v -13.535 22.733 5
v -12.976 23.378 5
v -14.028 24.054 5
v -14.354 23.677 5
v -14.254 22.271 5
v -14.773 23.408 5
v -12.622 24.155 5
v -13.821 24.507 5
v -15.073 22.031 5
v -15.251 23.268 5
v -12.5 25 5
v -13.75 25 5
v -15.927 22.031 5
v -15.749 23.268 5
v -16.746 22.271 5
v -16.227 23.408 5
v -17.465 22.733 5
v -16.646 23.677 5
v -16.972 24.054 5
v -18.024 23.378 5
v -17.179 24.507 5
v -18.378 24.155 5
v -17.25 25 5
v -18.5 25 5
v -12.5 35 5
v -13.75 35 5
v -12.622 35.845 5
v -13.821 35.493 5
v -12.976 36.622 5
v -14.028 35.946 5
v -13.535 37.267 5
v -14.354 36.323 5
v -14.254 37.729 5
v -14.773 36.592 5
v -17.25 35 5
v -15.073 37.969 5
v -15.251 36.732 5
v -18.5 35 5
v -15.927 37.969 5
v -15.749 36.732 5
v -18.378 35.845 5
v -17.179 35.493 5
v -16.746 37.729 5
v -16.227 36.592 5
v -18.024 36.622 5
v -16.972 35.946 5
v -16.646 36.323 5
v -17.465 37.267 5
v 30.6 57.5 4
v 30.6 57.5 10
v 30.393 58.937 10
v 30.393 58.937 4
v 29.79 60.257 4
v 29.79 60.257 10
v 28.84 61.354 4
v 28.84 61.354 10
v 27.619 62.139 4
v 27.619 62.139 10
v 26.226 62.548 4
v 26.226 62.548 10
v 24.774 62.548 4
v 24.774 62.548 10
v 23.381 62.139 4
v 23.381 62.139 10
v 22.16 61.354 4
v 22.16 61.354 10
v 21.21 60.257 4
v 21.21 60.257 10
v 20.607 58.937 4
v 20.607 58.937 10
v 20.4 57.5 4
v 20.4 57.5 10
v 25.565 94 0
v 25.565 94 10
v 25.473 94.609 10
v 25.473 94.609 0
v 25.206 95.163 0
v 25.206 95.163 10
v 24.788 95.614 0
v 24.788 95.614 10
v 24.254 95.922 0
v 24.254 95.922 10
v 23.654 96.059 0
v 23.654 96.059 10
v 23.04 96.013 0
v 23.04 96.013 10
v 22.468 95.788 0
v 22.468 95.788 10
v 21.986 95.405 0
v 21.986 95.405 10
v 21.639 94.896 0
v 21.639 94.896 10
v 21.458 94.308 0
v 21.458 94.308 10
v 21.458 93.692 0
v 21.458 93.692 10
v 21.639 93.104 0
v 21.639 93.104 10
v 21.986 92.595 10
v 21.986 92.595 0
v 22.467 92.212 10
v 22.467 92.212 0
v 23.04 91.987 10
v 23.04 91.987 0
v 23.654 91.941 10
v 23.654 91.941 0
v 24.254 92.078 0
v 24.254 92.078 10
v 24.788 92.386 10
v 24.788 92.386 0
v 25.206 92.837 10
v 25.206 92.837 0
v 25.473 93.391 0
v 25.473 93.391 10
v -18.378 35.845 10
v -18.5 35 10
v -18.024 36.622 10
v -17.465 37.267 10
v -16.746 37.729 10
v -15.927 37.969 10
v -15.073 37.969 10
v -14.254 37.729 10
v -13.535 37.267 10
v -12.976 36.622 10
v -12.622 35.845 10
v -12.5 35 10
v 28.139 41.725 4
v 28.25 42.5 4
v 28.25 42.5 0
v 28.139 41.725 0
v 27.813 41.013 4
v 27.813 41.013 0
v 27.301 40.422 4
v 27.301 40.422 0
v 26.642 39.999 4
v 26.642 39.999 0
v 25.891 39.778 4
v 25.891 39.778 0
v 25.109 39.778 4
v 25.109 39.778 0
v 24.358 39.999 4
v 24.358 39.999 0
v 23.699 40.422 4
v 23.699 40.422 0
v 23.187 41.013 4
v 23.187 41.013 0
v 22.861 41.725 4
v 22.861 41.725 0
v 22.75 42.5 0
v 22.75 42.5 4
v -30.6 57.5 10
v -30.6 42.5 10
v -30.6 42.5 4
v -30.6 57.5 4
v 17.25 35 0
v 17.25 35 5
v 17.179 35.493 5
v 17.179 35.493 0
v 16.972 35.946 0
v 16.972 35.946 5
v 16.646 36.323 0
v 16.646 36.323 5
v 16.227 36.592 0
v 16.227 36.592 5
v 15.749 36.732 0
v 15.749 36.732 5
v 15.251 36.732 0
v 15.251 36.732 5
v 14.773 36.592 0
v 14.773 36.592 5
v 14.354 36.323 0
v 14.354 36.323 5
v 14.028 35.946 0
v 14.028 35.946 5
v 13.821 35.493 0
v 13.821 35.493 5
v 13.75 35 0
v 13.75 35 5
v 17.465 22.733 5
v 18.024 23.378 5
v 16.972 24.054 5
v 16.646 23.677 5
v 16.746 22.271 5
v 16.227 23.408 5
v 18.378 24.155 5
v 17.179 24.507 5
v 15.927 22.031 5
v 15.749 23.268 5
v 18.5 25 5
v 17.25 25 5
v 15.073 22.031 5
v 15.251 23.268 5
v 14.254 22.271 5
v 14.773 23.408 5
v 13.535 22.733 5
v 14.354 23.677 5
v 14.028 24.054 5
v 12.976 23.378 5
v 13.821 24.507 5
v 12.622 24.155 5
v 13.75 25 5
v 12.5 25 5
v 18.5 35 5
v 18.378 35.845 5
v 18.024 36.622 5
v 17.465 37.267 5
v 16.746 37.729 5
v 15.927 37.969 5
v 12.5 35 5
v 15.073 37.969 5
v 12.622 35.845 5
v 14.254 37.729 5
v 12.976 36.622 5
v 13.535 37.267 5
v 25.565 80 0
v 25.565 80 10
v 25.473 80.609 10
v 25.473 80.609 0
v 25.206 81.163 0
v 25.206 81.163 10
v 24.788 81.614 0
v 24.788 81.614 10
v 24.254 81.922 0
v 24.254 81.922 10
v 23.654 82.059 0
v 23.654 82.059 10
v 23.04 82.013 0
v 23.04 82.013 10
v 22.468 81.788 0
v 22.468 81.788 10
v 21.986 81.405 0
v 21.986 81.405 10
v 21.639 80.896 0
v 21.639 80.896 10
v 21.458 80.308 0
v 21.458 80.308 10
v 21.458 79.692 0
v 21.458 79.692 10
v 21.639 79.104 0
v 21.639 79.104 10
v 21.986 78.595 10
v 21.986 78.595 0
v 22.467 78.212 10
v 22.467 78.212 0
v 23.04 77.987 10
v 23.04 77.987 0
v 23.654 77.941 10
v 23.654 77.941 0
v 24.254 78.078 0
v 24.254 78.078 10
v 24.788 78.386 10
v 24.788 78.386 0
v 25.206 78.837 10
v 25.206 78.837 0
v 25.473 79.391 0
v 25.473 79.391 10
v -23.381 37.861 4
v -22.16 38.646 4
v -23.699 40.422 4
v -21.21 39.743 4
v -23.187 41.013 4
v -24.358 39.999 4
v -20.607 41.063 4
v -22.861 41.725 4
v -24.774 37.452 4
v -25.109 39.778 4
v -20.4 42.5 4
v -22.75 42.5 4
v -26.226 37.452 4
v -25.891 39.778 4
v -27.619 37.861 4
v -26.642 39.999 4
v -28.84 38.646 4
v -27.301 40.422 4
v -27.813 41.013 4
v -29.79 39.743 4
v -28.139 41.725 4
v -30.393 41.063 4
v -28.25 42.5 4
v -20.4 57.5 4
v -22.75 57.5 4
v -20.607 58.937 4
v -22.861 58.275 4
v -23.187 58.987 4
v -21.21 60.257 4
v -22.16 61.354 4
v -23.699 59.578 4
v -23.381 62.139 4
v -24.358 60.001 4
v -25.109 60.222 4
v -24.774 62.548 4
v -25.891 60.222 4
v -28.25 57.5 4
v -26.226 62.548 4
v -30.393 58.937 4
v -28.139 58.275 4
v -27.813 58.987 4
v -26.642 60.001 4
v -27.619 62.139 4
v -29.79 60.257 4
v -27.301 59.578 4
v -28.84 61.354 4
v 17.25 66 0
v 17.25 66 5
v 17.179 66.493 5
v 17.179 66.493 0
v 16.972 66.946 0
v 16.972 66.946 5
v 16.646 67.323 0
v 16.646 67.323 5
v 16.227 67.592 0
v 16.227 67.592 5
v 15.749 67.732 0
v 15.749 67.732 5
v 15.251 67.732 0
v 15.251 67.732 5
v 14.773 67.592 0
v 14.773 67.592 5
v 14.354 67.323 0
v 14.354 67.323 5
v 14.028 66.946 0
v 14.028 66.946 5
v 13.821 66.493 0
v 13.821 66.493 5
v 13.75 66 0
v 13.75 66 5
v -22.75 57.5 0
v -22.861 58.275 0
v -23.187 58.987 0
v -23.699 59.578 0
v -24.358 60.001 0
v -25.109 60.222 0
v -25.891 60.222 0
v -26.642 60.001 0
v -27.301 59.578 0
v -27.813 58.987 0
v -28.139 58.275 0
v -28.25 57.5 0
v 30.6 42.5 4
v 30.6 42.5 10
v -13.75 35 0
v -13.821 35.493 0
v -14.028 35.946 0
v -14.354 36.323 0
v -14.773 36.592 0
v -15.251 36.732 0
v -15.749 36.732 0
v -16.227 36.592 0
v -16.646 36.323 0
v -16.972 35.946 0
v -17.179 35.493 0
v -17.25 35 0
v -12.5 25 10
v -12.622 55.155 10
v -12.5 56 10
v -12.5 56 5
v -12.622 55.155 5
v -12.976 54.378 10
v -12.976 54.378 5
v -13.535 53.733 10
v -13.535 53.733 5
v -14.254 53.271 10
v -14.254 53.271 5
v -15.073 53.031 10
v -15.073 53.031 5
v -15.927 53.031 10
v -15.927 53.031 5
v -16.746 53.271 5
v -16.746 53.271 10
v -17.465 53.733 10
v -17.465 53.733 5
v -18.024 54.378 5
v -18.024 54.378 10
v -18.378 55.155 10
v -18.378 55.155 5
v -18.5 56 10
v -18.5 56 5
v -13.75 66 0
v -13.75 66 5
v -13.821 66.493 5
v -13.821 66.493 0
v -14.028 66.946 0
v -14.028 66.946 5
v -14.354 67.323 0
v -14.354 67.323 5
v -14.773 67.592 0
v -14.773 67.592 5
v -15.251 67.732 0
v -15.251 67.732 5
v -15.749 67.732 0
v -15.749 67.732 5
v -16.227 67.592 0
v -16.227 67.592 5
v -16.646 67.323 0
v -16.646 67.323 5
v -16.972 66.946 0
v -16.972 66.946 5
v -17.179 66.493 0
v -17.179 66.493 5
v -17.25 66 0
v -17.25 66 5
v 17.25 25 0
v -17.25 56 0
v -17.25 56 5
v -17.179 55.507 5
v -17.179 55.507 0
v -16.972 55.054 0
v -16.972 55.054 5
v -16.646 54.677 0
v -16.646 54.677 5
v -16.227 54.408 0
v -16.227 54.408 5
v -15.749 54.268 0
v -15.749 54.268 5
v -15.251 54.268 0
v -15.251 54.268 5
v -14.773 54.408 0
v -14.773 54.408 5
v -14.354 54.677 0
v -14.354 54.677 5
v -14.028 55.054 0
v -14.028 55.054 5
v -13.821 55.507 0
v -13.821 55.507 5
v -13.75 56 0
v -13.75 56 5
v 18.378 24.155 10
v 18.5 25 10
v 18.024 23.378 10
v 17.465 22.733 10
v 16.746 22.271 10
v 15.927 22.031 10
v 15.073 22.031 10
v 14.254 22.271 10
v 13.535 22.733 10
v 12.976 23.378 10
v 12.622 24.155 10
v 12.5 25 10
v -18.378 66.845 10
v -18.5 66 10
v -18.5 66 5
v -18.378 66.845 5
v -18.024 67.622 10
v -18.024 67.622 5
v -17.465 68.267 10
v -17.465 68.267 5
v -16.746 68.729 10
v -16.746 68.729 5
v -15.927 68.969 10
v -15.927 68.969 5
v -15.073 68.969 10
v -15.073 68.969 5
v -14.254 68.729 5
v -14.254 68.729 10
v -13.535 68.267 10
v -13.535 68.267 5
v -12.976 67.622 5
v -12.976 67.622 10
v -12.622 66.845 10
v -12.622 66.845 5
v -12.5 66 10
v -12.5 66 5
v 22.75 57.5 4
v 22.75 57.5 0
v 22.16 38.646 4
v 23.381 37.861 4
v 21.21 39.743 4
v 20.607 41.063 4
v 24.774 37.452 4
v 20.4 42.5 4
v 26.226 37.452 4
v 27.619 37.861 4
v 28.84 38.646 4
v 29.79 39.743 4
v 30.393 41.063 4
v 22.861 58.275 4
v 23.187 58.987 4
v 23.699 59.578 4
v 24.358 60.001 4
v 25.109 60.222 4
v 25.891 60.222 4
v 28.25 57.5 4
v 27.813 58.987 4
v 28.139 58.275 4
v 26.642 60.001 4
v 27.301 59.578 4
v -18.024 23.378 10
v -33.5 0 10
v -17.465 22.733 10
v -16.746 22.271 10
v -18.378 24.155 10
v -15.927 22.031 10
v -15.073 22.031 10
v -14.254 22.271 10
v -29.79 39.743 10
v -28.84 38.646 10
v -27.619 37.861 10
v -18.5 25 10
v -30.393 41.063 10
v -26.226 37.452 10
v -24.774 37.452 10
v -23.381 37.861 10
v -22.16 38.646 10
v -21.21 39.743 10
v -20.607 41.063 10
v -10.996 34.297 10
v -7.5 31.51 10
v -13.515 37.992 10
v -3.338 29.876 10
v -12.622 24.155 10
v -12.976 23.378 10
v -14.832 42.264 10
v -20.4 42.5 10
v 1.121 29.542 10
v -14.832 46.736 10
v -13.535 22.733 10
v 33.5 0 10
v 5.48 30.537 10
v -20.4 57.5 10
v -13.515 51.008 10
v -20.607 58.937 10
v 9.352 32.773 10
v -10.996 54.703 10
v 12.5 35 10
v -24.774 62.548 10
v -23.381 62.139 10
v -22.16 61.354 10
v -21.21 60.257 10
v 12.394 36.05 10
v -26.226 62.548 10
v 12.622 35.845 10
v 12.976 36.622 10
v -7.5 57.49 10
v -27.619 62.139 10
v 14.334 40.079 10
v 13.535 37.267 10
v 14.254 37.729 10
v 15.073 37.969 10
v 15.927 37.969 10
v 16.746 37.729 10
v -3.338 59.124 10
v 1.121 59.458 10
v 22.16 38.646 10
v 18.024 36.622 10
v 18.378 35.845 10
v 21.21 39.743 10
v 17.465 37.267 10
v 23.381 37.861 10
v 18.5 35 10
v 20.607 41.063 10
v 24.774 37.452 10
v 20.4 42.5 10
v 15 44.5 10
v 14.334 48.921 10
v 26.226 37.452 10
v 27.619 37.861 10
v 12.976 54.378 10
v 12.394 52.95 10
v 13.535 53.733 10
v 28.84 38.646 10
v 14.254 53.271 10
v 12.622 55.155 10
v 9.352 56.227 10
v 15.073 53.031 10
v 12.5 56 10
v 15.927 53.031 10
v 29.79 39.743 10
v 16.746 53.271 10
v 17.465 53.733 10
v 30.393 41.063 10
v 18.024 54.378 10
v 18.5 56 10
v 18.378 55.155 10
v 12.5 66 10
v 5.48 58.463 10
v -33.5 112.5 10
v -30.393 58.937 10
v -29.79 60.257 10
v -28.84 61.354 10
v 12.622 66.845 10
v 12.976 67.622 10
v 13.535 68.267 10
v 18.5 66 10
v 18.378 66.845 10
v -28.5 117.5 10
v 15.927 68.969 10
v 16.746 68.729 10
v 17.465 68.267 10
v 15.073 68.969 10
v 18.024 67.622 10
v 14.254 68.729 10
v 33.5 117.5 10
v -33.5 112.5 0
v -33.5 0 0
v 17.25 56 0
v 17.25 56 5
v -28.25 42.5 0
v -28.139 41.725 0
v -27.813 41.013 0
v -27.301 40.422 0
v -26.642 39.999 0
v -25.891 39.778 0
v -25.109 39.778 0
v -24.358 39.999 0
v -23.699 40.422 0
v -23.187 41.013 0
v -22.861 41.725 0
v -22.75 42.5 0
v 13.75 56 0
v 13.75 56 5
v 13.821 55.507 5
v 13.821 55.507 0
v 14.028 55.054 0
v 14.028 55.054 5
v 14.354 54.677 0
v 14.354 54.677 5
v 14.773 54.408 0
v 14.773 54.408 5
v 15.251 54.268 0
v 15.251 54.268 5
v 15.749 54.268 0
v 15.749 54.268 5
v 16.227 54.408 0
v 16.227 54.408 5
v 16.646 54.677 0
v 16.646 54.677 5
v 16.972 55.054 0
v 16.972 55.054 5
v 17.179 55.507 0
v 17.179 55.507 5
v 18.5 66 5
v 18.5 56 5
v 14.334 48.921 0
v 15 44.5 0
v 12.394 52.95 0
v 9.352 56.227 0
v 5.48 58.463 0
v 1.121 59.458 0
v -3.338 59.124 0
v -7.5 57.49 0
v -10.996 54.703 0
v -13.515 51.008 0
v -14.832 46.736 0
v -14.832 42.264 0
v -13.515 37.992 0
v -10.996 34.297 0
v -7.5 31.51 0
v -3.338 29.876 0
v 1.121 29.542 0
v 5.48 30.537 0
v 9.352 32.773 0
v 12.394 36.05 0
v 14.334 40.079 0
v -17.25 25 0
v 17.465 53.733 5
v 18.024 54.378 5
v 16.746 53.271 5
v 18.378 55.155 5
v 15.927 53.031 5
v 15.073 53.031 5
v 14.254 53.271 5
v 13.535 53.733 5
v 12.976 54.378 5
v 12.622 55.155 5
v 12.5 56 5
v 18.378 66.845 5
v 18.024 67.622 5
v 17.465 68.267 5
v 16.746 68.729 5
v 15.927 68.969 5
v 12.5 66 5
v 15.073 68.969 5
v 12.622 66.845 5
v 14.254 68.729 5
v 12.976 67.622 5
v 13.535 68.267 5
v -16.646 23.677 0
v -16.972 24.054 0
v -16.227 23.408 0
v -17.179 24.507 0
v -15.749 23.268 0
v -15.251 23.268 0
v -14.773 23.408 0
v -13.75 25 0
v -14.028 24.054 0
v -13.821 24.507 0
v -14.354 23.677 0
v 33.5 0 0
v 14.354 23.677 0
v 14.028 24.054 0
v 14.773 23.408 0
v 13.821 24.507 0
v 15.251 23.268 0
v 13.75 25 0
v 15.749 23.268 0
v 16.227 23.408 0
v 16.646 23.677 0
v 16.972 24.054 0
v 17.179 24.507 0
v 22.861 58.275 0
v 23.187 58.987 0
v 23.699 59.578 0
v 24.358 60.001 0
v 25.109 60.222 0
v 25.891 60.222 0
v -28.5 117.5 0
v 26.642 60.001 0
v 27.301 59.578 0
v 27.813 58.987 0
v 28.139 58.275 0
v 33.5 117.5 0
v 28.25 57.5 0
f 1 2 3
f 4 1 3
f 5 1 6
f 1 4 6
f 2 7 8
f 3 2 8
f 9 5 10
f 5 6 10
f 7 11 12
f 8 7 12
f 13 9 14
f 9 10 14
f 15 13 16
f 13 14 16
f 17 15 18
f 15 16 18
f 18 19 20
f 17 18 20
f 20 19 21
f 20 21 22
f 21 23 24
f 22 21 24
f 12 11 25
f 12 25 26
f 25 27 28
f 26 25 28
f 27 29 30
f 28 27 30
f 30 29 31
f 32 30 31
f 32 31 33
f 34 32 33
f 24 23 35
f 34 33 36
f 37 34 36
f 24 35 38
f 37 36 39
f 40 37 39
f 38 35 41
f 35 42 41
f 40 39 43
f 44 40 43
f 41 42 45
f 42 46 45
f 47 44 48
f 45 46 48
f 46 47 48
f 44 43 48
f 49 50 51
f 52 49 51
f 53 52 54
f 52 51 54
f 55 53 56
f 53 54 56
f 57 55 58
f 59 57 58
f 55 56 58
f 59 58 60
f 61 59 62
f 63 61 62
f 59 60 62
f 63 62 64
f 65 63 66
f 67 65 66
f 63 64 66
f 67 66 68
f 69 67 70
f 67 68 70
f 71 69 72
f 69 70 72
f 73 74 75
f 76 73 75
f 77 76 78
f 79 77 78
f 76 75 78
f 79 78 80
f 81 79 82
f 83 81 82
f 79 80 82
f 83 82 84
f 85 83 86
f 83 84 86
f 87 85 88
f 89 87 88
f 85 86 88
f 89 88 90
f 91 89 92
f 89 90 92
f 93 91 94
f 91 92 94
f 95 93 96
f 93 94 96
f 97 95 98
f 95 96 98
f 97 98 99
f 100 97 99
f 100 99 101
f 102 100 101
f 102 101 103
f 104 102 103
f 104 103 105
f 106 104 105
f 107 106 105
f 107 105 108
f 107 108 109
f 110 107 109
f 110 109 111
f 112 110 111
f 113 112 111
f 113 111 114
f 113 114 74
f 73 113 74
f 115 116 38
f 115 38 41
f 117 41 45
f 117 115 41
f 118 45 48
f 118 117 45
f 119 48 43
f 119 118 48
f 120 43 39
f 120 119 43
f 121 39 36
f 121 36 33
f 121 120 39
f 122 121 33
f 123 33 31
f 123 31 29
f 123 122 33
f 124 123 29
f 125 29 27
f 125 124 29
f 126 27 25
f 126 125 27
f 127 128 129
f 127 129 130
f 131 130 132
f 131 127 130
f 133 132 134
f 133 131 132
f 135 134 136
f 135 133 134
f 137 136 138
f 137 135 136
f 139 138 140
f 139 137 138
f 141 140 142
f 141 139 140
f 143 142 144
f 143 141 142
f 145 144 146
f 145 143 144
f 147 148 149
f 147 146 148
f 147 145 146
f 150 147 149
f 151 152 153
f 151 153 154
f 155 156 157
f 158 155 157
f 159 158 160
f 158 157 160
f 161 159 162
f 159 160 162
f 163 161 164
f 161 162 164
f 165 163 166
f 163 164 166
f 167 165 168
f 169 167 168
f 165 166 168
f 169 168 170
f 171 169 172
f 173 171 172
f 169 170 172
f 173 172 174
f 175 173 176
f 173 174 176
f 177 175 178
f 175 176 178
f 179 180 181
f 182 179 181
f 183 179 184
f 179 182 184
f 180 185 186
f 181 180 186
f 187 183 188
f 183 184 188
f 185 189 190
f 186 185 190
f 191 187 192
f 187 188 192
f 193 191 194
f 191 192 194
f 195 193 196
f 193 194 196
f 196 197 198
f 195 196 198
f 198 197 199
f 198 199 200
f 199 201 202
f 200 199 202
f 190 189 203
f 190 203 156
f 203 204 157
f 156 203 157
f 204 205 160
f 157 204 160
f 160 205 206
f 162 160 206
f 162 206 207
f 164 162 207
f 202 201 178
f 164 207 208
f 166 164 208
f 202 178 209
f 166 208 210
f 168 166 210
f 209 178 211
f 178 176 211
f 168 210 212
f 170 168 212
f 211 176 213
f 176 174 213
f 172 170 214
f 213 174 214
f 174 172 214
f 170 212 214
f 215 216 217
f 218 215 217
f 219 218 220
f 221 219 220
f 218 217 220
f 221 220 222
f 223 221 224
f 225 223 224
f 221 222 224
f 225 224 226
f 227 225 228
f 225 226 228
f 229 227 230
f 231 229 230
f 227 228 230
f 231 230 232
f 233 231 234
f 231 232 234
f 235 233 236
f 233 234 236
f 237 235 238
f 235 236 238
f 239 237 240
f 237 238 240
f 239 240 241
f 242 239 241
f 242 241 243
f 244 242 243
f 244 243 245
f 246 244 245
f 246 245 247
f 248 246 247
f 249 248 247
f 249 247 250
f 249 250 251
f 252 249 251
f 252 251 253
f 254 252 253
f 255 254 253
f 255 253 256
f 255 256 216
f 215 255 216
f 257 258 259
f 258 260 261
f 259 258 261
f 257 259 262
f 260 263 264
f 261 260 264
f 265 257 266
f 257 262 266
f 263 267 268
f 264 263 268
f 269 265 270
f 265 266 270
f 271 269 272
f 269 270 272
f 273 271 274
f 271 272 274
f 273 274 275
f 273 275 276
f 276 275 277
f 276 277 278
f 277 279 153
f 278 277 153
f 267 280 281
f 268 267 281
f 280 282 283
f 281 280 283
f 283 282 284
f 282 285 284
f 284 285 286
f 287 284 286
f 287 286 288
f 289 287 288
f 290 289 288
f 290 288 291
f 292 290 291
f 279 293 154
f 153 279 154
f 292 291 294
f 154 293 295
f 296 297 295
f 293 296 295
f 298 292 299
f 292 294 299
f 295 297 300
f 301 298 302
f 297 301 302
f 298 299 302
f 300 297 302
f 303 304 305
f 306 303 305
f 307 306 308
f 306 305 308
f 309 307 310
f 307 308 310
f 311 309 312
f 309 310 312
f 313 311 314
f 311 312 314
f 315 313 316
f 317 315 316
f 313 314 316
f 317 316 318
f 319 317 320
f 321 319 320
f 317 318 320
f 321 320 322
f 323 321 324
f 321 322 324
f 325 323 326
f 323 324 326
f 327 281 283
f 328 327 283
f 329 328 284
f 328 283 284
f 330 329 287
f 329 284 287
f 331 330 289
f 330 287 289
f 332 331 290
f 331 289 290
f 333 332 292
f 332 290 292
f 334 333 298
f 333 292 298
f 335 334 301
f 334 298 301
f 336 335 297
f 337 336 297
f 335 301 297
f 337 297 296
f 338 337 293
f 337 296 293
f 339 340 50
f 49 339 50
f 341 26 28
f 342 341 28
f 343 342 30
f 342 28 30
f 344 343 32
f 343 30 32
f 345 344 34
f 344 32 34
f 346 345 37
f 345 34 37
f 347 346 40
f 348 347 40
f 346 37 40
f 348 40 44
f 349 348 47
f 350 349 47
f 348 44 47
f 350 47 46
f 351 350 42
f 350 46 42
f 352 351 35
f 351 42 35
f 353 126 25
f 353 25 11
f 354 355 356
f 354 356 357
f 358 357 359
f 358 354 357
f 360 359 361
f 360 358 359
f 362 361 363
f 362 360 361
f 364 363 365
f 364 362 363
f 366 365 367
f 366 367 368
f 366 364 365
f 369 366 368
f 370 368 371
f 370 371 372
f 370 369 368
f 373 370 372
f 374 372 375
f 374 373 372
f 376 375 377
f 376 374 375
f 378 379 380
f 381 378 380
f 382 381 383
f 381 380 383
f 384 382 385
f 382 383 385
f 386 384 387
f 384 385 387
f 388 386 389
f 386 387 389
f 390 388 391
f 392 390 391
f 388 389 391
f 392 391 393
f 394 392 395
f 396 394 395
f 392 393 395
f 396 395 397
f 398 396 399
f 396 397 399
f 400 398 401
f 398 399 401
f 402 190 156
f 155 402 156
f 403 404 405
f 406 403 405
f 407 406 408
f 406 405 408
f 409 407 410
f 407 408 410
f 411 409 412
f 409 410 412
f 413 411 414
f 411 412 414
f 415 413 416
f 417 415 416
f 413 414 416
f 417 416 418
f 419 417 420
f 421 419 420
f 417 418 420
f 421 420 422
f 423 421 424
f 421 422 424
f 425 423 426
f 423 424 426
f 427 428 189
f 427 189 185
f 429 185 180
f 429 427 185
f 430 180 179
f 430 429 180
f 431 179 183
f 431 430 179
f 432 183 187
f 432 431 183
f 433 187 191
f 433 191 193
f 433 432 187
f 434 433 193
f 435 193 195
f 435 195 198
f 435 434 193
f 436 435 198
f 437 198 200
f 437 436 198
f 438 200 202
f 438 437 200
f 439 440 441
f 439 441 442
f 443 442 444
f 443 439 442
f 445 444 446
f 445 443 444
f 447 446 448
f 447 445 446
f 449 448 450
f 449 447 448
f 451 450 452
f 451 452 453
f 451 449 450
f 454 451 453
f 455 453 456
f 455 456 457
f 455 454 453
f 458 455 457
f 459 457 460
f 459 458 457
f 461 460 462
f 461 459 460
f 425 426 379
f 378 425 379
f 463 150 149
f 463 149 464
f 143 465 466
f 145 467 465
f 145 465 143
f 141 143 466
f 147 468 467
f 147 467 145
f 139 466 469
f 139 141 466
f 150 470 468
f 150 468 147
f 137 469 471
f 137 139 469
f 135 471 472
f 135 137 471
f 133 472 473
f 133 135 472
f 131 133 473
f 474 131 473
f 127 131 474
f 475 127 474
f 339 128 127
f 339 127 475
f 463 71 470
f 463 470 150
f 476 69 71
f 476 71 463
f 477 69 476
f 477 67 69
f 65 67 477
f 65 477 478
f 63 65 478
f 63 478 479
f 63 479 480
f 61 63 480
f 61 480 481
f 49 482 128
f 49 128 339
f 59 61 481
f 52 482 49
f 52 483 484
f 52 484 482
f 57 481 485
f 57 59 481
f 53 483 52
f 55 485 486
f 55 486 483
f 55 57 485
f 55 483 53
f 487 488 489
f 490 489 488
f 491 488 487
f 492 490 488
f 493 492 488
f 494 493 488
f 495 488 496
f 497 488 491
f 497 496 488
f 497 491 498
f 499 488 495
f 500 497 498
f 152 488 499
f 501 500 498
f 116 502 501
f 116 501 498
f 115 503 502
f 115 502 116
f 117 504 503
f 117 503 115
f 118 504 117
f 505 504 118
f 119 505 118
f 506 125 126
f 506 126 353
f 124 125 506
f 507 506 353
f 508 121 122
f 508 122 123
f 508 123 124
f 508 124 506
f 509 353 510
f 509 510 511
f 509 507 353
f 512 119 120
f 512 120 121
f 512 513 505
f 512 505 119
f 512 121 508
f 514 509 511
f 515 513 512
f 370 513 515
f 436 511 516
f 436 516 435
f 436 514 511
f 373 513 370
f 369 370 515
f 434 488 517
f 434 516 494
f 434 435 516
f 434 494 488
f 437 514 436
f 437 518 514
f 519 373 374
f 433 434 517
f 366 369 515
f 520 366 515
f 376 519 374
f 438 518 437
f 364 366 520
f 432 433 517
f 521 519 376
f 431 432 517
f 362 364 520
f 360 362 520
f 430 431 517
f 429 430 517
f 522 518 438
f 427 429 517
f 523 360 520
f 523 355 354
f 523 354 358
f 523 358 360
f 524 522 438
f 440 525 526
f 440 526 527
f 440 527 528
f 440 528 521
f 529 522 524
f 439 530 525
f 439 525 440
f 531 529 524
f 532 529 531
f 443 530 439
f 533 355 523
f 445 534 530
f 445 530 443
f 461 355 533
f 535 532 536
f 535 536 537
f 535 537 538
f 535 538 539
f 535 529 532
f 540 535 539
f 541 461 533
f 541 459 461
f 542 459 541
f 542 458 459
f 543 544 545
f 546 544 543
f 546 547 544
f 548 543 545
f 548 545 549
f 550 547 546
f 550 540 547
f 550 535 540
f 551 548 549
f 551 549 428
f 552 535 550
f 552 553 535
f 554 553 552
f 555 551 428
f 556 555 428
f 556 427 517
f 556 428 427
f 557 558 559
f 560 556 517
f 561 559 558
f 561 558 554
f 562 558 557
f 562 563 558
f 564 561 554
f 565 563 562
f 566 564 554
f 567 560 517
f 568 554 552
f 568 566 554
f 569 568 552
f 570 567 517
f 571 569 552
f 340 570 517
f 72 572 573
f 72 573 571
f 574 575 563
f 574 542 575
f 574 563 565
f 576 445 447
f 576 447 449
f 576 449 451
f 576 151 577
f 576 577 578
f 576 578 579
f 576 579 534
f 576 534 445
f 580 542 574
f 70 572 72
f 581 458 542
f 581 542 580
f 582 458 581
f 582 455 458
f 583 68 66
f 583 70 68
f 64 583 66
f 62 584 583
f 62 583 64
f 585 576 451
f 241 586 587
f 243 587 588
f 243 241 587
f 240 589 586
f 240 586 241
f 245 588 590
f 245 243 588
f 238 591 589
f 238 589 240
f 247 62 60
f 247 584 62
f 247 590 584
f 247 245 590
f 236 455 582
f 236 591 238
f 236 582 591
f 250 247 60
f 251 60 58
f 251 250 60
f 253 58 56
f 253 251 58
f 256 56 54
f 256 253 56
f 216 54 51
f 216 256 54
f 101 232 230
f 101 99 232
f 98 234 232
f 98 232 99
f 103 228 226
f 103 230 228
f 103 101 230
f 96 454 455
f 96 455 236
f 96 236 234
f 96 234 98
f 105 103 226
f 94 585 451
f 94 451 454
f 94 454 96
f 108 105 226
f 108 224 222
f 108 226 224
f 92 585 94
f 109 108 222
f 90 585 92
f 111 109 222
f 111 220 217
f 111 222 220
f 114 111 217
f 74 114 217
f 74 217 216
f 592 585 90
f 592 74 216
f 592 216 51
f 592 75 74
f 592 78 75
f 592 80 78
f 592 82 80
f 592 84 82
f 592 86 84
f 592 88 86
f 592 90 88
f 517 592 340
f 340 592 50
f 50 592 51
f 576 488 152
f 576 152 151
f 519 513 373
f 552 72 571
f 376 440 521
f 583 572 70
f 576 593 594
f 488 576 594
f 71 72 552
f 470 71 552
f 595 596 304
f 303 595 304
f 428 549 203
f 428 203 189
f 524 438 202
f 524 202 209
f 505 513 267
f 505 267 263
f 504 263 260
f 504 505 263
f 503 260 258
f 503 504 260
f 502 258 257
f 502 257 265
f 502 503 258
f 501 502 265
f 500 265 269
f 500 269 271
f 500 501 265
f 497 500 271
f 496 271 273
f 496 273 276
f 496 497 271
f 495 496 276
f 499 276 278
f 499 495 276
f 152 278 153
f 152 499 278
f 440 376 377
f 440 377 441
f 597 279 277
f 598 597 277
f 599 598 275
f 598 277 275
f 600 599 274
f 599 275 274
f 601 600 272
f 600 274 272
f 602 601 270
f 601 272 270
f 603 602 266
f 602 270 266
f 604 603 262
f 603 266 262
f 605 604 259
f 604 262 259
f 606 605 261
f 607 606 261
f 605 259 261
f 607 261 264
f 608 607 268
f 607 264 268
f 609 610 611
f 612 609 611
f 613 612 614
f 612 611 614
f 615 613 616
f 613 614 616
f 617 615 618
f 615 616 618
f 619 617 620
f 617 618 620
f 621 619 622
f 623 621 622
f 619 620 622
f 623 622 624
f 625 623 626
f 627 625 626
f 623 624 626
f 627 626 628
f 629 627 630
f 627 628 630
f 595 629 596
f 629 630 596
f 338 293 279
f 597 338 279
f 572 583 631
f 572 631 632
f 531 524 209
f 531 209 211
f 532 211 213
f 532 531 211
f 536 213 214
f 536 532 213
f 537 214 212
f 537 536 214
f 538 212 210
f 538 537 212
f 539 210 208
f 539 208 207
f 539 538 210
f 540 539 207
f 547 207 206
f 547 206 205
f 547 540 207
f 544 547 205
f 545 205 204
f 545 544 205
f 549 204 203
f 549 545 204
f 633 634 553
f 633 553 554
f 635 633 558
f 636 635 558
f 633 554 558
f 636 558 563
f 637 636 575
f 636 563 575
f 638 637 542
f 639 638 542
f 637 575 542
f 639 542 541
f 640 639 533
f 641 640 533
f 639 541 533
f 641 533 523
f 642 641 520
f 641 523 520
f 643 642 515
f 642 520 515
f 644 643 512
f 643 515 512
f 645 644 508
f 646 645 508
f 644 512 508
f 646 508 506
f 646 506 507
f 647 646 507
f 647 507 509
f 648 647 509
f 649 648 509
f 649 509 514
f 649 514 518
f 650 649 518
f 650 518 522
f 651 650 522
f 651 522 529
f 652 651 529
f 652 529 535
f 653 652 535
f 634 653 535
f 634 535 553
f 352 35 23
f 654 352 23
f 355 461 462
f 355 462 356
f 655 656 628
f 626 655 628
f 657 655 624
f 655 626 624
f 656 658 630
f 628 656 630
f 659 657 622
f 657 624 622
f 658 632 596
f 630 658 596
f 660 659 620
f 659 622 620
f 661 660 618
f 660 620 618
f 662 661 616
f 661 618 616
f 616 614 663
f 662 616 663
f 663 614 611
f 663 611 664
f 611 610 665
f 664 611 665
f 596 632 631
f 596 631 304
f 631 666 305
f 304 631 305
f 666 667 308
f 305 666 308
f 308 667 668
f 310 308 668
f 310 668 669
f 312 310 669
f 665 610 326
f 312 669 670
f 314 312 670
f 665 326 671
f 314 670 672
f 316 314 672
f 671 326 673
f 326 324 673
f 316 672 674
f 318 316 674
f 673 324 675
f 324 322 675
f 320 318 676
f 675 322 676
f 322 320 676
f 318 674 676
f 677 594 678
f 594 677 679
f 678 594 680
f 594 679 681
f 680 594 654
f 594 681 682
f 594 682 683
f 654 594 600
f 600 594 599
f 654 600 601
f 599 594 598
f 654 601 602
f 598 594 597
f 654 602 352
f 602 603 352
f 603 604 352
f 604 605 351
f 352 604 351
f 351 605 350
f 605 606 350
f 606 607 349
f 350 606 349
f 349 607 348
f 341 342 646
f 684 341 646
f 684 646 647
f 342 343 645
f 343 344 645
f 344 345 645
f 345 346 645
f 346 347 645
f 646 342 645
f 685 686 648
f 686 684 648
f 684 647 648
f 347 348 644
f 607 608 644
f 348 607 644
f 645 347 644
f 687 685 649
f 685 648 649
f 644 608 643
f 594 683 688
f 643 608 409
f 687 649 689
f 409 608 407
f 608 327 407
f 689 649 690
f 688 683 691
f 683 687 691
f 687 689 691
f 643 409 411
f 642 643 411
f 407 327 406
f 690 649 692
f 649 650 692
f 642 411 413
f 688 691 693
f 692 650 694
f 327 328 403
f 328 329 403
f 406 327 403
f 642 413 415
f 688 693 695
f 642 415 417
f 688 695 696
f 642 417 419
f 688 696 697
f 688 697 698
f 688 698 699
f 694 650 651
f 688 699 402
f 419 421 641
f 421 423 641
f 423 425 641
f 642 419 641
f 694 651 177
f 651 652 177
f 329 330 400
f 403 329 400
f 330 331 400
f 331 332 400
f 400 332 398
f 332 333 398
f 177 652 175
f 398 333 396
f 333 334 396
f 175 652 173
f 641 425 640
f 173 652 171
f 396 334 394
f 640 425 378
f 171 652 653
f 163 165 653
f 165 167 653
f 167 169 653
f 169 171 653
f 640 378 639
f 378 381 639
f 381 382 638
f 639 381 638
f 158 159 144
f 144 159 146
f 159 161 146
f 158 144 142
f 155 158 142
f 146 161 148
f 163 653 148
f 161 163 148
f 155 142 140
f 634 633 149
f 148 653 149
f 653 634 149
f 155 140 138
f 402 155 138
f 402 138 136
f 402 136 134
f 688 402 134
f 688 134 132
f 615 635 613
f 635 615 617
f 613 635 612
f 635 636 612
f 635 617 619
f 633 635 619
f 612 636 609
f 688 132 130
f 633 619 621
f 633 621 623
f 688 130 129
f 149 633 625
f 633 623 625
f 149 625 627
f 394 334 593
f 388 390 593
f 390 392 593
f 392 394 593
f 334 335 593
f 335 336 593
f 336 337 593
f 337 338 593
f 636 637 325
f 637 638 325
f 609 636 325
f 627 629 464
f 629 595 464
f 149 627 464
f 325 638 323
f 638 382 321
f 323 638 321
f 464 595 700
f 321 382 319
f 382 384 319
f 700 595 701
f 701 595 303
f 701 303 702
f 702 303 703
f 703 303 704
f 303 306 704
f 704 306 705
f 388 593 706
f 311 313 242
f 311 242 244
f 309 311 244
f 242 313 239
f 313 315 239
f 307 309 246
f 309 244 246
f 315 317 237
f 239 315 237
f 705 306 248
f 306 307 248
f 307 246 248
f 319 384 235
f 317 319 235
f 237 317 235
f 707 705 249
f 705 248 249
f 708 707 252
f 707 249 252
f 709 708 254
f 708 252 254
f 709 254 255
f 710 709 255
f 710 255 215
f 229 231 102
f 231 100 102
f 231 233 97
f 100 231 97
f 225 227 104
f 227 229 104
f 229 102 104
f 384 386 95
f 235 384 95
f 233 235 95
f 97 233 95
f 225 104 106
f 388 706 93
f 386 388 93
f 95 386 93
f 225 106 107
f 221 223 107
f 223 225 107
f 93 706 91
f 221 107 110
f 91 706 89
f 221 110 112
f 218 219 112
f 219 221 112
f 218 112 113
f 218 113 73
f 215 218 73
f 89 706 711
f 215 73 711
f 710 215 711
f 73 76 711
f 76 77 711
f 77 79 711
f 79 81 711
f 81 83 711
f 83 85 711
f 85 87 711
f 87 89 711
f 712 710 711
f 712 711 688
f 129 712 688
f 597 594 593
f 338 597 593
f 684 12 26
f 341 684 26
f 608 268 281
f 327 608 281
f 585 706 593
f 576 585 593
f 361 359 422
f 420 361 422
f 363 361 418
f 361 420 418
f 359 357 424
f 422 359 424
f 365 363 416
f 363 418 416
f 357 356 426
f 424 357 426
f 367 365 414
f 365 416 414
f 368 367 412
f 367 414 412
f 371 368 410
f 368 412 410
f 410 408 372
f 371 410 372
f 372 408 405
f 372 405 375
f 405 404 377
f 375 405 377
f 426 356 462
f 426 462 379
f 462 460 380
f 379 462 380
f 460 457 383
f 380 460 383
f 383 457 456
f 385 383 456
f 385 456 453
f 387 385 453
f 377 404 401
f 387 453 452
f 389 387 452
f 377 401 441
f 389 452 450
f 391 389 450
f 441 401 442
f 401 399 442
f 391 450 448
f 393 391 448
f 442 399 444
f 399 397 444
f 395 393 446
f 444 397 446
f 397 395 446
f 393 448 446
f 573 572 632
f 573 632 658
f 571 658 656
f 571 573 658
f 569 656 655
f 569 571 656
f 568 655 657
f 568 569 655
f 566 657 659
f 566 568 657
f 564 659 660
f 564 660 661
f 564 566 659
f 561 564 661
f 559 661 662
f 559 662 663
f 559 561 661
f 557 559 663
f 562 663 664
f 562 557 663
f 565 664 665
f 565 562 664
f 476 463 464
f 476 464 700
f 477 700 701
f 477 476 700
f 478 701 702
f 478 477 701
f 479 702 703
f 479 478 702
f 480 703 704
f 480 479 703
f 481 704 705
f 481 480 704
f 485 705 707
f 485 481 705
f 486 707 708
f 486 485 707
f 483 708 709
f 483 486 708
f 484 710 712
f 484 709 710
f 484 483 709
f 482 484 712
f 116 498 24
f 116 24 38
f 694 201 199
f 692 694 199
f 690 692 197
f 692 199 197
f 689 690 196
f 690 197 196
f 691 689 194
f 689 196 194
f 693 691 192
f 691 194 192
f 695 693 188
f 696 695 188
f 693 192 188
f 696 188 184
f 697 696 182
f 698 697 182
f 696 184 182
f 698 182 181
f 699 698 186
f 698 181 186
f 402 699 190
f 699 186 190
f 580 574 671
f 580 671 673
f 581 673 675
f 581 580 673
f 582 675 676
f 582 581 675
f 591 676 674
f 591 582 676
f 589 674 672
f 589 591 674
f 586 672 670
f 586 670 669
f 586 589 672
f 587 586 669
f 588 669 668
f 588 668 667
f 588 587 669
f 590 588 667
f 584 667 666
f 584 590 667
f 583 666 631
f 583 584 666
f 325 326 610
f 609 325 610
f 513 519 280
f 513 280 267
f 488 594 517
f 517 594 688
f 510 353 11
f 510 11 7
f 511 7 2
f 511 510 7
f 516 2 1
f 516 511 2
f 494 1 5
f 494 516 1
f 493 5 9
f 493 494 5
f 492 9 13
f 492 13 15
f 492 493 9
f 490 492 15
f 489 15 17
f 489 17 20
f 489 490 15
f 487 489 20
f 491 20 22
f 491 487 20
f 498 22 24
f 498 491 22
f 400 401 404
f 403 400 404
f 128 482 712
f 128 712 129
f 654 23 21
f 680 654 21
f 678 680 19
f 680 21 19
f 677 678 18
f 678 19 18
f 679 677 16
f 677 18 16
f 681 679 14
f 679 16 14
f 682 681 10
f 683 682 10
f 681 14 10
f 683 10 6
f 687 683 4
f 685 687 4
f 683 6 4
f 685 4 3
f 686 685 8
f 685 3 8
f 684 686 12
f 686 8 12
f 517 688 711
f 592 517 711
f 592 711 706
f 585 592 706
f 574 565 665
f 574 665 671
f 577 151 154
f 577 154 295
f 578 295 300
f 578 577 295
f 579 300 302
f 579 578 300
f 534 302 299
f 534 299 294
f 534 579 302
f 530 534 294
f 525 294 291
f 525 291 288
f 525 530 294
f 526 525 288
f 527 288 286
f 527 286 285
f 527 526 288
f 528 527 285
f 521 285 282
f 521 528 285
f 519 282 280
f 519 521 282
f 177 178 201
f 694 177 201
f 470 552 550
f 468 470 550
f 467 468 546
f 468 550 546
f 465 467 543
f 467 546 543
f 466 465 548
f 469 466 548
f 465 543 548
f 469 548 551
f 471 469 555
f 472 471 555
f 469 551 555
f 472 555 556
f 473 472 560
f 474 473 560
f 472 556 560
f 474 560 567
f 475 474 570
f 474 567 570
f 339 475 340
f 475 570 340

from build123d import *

# Parameters (mm, degrees)
BOSS_EXTRUDE1_DEPTH  = 10
SKETCH2_R            = 15
MOTOR_HOLE_DEPTH     = 11
SCREW_HOLE_DEPTH     = 5
CUT_EXTRUDE3_DEPTH   = 6
LPATTERN1_COUNT      = 2
LPATTERN1_PITCH      = 31
LPATTERN1_COUNT_DIR2 = 2
LPATTERN1_PITCH_DIR2 = 31
CUT_EXTRUDE4_DEPTH   = 6
CUT_EXTRUDE5_DEPTH   = 5
SKETCH8_R            = 2.065
CUT_EXTRUDE6_DEPTH   = 11


with BuildPart() as part:
    # Sketch1 → Boss-Extrude1 (new body)
    with BuildSketch(Plane.XY):
        Polygon((-33.5, 0), (33.5, 0), (33.5, 117.5), (-28.5, 117.5), (-33.5, 112.5), align=None)
    extrude(amount=BOSS_EXTRUDE1_DEPTH)

    # Sketch2 → Motor Hole (cut, through all)
    with BuildSketch(Plane.XY.offset(10)):
        with Locations((0, 44.5)):
            Circle(SKETCH2_R)
    extrude(amount=-MOTOR_HOLE_DEPTH, mode=Mode.SUBTRACT)

    # Sketch3 → Screw Hole (cut)
    with BuildSketch(Plane.XY.offset(10)):
        with BuildLine():
            Line((-12.5, 66), (-12.5, 56))
            ThreePointArc((-12.5, 56), (-15.5, 53), (-18.5, 56))
            Line((-18.5, 56), (-18.5, 66))
            ThreePointArc((-18.5, 66), (-15.5, 69), (-12.5, 66))
        make_face()
    screw_hole = extrude(amount=-SCREW_HOLE_DEPTH, mode=Mode.SUBTRACT)

    # Sketch5 → Cut-Extrude3 (cut, through all)
    with BuildSketch(Plane.XY.offset(5)):
        with BuildLine():
            Line((-17.25, 66), (-17.25, 56))
            ThreePointArc((-17.25, 56), (-15.5, 54.25), (-13.75, 56))
            Line((-13.75, 56), (-13.75, 66))
            ThreePointArc((-13.75, 66), (-15.5, 67.75), (-17.25, 66))
        make_face()
    cut_extrude3 = extrude(amount=-CUT_EXTRUDE3_DEPTH, mode=Mode.SUBTRACT)

    # LPattern1: Screw Hole, Cut-Extrude3 2 × 2
    with Locations(*[(i * LPATTERN1_PITCH, -j * LPATTERN1_PITCH_DIR2, 0) for i in range(LPATTERN1_COUNT) for j in range(LPATTERN1_COUNT_DIR2) if (i, j) != (0, 0)]):
        add(screw_hole, mode=Mode.SUBTRACT)
        add(cut_extrude3, mode=Mode.SUBTRACT)

    # Sketch6 → Cut-Extrude4 (cut)
    with BuildSketch(Plane.XY.offset(10)):
        with BuildLine():
            Line((-20.4, 57.5), (-20.4, 42.5))
            ThreePointArc((-20.4, 42.5), (-25.5, 37.4), (-30.6, 42.5))
            Line((-30.6, 42.5), (-30.6, 57.5))
            ThreePointArc((-30.6, 57.5), (-25.5, 62.6), (-20.4, 57.5))
        make_face()
    cut_extrude4 = extrude(amount=-CUT_EXTRUDE4_DEPTH, mode=Mode.SUBTRACT)

    # Sketch7 → Cut-Extrude5 (cut, through all)
    with BuildSketch(Plane.XY.offset(4)):
        with BuildLine():
            Line((-28.25, 57.5), (-28.25, 42.5))
            ThreePointArc((-28.25, 42.5), (-25.5, 39.75), (-22.75, 42.5))
            Line((-22.75, 42.5), (-22.75, 57.5))
            ThreePointArc((-22.75, 57.5), (-25.5, 60.25), (-28.25, 57.5))
        make_face()
    cut_extrude5 = extrude(amount=-CUT_EXTRUDE5_DEPTH, mode=Mode.SUBTRACT)

    # Mirror1: Cut-Extrude4, Cut-Extrude5 across plane
    add(cut_extrude4.mirror(Plane(origin=(0, 0, 0), x_dir=(0, 0, 1), z_dir=(1, 0, 0))), mode=Mode.SUBTRACT)
    add(cut_extrude5.mirror(Plane(origin=(0, 0, 0), x_dir=(0, 0, 1), z_dir=(1, 0, 0))), mode=Mode.SUBTRACT)

    # Sketch8 → Cut-Extrude6 (cut, through all)
    with BuildSketch(Plane.XY.offset(10)):
        with Locations((23.5, 94)):
            Circle(SKETCH8_R)
        with Locations((23.5, 80)):
            Circle(SKETCH8_R)
    extrude(amount=-CUT_EXTRUDE6_DEPTH, mode=Mode.SUBTRACT)


solid = part.part
